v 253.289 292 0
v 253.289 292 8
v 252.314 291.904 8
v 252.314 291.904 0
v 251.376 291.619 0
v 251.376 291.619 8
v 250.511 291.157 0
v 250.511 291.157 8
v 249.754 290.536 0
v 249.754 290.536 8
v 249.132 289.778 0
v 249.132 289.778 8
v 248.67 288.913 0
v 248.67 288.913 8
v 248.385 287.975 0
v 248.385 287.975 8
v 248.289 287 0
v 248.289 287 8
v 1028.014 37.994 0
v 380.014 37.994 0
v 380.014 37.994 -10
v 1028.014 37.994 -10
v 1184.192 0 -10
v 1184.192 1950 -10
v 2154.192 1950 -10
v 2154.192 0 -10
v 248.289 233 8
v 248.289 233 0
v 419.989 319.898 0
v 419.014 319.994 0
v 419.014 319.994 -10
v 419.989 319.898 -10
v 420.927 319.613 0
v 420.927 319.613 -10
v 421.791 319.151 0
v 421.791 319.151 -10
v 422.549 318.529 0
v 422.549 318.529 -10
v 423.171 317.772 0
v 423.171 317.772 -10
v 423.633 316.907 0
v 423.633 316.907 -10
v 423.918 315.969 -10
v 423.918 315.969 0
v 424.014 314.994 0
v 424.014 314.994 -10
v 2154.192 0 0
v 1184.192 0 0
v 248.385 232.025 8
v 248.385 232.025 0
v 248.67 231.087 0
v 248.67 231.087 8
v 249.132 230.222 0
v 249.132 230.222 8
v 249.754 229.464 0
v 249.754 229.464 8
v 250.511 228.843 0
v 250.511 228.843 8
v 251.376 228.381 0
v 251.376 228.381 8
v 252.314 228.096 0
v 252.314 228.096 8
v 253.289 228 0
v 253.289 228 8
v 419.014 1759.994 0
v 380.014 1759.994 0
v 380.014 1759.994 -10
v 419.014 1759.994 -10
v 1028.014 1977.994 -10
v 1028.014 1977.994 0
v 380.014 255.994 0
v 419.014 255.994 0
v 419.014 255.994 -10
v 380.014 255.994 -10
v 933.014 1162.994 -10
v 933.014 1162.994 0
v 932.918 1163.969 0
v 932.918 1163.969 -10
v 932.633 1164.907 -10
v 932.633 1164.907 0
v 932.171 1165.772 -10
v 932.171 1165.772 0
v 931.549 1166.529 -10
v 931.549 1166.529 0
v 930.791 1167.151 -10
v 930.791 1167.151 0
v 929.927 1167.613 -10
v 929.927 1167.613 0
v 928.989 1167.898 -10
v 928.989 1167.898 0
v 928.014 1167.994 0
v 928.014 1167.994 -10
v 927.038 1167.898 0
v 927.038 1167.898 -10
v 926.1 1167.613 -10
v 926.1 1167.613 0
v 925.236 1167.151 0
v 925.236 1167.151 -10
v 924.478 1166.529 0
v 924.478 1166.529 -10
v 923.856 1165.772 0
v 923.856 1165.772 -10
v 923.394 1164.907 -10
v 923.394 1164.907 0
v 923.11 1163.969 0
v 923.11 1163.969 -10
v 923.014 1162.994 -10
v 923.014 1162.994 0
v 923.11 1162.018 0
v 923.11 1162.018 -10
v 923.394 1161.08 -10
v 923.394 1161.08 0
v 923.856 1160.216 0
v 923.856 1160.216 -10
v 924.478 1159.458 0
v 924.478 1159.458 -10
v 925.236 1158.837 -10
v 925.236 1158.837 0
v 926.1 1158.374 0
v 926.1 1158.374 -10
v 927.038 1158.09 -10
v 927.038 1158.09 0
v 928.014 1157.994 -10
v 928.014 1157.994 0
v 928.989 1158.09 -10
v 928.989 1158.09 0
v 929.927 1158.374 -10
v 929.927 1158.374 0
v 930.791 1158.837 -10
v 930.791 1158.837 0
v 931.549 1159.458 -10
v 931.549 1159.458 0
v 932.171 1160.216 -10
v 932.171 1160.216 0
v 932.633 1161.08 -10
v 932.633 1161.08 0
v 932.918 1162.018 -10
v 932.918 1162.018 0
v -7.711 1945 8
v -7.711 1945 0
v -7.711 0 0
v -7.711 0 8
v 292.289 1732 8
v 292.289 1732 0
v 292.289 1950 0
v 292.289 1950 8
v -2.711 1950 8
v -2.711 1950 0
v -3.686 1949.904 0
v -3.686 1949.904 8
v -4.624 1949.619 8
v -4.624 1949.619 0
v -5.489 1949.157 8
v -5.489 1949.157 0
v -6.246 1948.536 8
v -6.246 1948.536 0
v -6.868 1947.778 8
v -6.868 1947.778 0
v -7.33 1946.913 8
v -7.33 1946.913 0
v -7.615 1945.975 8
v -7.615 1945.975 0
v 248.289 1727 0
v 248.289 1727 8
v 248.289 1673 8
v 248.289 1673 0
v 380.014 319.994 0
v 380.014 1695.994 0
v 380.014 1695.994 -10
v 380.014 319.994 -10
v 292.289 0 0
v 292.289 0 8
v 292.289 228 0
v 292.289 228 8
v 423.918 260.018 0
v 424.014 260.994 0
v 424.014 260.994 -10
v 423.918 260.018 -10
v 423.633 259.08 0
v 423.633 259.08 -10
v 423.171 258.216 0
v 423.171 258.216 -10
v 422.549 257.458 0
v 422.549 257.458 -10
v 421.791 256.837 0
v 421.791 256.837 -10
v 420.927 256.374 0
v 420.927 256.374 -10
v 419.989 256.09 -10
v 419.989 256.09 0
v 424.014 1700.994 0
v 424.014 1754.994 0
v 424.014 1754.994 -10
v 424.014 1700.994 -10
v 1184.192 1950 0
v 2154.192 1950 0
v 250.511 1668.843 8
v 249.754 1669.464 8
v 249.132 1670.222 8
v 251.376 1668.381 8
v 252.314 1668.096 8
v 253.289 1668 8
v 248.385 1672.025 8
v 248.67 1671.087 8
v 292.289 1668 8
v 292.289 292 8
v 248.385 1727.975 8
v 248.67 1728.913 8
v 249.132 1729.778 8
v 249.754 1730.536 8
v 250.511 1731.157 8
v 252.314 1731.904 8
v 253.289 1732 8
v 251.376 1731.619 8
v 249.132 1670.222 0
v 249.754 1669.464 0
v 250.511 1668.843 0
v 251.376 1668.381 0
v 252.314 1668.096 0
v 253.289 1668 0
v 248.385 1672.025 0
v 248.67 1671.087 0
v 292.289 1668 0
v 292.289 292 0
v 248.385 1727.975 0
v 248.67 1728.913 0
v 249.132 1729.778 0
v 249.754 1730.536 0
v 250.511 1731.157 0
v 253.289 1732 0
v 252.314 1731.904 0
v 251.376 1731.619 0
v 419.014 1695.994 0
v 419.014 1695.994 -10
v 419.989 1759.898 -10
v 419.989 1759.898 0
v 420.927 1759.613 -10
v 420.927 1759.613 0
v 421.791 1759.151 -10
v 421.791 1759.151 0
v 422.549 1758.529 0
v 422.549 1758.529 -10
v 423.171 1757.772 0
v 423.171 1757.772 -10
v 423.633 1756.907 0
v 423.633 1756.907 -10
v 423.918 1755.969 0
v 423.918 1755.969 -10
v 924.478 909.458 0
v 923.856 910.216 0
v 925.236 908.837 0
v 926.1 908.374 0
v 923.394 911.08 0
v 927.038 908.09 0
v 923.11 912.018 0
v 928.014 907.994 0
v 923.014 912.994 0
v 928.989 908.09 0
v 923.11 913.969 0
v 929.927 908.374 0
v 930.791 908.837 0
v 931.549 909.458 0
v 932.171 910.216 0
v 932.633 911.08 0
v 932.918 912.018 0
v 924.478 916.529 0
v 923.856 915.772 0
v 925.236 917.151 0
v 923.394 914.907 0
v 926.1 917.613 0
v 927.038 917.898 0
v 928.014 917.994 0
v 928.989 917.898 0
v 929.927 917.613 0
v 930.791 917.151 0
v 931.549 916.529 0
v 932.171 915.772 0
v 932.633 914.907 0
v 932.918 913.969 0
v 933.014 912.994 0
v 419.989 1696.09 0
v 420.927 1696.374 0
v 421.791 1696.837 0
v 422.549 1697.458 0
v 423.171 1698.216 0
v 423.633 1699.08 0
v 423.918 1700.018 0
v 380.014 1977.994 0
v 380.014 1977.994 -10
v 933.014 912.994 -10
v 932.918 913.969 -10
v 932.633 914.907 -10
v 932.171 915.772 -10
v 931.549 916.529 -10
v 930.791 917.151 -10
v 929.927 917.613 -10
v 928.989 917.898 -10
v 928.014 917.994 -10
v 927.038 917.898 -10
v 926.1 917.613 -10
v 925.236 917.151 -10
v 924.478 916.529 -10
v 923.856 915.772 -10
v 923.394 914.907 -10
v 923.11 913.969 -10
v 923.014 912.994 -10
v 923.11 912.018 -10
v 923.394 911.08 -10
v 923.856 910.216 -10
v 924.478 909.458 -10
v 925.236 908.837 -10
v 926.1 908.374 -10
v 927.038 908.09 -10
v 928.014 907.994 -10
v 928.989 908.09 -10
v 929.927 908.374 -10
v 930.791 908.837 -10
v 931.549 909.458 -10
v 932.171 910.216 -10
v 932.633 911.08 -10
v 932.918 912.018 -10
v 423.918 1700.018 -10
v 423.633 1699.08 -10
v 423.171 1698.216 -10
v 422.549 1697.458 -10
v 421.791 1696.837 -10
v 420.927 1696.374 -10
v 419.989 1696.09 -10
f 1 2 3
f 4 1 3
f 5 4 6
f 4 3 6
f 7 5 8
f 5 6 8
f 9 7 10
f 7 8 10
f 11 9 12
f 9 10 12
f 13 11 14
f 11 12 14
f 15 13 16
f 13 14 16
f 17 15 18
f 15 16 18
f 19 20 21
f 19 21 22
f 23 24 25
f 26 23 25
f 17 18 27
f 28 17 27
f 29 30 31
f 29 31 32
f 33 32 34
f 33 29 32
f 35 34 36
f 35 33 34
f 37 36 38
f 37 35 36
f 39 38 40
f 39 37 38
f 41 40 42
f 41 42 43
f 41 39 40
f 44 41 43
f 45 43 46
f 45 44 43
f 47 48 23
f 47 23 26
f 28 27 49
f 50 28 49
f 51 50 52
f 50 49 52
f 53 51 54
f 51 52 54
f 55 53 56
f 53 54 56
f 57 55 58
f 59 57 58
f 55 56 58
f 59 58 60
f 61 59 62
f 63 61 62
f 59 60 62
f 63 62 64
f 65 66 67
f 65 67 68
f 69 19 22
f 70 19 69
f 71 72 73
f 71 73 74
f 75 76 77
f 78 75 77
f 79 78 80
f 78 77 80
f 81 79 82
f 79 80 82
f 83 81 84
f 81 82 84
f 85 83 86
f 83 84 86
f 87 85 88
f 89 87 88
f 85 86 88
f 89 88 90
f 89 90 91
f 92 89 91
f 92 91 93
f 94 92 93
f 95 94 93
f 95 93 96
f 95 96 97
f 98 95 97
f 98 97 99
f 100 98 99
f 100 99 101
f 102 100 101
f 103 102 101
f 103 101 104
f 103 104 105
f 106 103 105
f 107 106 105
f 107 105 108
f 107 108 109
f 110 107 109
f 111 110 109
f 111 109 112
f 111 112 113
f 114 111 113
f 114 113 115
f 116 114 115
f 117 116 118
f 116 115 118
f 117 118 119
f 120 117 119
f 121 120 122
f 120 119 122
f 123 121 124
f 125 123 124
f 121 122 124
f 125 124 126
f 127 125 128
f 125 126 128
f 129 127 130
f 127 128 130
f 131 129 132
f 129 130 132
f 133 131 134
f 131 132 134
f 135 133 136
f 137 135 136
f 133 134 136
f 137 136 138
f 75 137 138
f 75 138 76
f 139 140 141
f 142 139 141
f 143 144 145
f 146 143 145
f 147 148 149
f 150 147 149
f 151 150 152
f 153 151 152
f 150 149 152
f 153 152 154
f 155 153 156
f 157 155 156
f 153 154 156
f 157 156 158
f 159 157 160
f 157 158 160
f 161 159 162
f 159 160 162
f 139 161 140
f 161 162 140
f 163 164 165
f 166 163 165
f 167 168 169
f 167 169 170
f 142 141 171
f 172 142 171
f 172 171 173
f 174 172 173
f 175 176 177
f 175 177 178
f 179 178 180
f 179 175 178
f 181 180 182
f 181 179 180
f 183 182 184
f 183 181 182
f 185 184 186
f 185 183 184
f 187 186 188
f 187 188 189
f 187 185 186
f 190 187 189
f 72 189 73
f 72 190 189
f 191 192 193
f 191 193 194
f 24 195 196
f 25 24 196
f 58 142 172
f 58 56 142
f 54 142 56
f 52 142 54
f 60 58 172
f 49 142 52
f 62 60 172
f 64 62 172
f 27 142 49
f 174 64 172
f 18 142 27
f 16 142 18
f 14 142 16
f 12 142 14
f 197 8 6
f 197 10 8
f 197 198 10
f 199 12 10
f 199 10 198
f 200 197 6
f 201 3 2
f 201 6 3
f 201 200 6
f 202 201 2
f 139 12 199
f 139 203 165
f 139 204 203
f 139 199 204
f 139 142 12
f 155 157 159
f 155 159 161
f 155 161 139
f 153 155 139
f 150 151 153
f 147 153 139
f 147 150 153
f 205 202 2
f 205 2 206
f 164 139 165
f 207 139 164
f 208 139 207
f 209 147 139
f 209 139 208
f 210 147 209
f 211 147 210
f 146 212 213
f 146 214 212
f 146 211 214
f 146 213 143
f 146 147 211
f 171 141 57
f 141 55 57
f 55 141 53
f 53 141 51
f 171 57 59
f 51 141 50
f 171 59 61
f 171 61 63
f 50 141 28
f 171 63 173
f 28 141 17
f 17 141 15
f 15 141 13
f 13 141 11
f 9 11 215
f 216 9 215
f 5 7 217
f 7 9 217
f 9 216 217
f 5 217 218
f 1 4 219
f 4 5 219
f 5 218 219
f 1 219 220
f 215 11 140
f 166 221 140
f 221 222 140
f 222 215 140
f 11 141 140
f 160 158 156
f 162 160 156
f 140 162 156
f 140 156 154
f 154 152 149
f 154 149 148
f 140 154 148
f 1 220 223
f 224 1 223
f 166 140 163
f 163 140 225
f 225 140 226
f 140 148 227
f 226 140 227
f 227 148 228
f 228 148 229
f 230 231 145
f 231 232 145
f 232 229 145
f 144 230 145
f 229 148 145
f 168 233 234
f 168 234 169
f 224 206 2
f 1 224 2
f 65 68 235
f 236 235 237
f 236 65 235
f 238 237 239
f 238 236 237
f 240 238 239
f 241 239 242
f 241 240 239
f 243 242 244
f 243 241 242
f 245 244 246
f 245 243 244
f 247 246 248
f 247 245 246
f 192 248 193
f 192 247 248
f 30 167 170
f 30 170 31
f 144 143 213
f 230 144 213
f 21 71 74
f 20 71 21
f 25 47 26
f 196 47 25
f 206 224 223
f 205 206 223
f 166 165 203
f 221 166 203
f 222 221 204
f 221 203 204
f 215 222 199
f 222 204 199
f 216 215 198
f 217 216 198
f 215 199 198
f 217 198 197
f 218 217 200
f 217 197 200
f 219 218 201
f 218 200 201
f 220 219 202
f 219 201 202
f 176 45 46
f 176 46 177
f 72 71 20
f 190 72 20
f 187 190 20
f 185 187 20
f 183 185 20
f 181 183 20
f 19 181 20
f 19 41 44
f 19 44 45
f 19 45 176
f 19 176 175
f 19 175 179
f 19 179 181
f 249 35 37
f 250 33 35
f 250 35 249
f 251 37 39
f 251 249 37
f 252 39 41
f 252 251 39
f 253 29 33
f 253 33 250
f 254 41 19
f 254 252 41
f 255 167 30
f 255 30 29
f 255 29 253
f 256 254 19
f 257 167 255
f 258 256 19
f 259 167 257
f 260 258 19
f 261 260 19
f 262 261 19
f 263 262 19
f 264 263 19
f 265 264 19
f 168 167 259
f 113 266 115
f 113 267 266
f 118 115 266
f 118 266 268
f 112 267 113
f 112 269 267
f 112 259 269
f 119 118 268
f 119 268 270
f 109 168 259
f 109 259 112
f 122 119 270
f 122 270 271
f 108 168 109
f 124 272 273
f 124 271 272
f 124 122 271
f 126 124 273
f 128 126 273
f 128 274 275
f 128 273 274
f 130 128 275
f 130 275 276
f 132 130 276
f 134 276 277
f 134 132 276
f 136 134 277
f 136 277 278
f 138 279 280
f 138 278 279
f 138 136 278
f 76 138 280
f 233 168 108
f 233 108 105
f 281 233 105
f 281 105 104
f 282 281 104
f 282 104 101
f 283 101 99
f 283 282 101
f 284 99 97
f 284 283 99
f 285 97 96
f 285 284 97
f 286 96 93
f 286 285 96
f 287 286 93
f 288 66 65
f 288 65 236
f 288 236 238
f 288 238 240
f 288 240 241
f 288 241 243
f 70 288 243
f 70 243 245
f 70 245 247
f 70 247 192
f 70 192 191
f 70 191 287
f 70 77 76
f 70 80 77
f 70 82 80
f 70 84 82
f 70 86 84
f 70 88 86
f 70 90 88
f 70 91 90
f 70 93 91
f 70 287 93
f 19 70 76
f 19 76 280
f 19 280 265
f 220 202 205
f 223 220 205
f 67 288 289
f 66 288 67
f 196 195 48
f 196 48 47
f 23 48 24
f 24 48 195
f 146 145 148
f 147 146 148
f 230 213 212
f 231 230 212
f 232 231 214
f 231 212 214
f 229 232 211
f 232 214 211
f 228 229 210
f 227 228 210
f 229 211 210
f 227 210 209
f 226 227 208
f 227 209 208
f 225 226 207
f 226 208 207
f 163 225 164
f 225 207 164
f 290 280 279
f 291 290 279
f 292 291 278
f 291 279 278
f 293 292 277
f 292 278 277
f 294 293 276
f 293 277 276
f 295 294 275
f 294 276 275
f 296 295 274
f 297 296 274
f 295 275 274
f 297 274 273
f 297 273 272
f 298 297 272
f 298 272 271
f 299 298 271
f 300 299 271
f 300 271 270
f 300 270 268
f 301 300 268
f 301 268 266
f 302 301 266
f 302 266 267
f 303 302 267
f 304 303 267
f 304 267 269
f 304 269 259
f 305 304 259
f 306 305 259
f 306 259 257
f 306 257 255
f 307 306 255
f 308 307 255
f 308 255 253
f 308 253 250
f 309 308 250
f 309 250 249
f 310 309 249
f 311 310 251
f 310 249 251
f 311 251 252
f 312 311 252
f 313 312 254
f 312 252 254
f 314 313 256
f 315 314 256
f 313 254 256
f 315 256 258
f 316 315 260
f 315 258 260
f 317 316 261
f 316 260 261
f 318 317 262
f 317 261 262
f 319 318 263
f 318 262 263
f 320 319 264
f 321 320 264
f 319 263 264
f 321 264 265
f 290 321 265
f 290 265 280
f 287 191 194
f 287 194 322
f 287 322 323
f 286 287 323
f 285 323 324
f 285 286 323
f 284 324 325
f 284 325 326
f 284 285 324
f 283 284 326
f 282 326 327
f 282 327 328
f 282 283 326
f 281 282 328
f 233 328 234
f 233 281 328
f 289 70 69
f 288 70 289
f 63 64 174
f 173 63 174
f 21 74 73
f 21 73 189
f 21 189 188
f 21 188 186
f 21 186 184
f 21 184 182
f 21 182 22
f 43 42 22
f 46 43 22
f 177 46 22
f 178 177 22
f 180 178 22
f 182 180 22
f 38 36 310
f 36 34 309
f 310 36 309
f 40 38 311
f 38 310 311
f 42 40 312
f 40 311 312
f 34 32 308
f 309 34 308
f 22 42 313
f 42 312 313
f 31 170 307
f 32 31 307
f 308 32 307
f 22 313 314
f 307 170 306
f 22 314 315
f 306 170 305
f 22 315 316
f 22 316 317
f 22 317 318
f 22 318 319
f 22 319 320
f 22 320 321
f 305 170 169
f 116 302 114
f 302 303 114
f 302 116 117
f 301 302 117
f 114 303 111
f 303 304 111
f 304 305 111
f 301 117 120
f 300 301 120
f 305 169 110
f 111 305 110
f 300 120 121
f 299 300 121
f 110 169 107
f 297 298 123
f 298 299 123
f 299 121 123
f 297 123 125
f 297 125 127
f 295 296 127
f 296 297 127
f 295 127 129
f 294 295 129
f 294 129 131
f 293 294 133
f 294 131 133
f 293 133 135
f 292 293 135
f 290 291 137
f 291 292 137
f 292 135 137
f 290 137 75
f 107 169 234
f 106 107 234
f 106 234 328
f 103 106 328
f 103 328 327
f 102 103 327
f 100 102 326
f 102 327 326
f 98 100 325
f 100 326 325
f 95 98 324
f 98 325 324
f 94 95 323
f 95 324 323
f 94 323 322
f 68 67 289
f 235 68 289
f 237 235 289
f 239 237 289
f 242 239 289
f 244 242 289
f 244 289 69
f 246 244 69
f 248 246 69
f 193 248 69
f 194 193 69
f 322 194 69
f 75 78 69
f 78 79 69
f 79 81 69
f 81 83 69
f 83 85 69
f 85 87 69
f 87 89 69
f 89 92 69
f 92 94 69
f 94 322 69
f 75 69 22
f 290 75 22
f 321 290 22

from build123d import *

# Parameters (mm, degrees)
F1_DEPTH = 8
F3_DEPTH = 25
F5_DEPTH = 10
F6_R     = 5
F7_DEPTH = 10.001
F8_W     = 970
F8_H     = 1950
F9_DEPTH = 10


with BuildPart() as f1:
    # F0 (on Top) → F1 (new body)
    with BuildSketch(Plane.XY):
        with BuildLine():
            Line((-7.710888, 0), (292.289112, 0))
            Line((292.289112, 0), (292.289112, 1950))
            Line((292.289112, 1950), (-2.710888, 1950))
            ThreePointArc((-2.710888, 1950), (-6.246421, 1948.535534), (-7.710888, 1945))
            Line((-7.710888, 1945), (-7.710888, 0))
        make_face()
    extrude(amount=F1_DEPTH)

    # F2 (on face) → F3 (cut)
    with BuildSketch(Plane.XY.offset(8)):
        with BuildLine():
            Line((292.289112, 1668), (292.289112, 1732))
            Line((292.289112, 1732), (253.289112, 1732))
            ThreePointArc((253.289112, 1732), (249.753579, 1730.535534), (248.289112, 1727))
            Line((248.289112, 1727), (248.289112, 1673))
            ThreePointArc((248.289112, 1673), (249.753579, 1669.464466), (253.289112, 1668))
            Line((253.289112, 1668), (292.289112, 1668))
        make_face()
        with BuildLine():
            Line((292.289112, 228), (292.289112, 292))
            Line((292.289112, 292), (253.289112, 292))
            ThreePointArc((253.289112, 292), (249.753579, 290.535534), (248.289112, 287))
            Line((248.289112, 287), (248.289112, 233))
            ThreePointArc((248.289112, 233), (249.753579, 229.464466), (253.289112, 228))
            Line((253.289112, 228), (292.289112, 228))
        make_face()
    extrude(amount=-F3_DEPTH, mode=Mode.SUBTRACT)


with BuildPart() as f5:
    # F4 (on Top) → F5 (new body)
    with BuildSketch(Plane.XY):
        with BuildLine():
            Line((1028.013587, 1977.993873), (380.013587, 1977.993873))
            Line((380.013587, 1977.993873), (380.013587, 1759.993873))
            Line((380.013587, 1759.993873), (419.013587, 1759.993873))
            ThreePointArc((419.013587, 1759.993873), (422.549121, 1758.529407), (424.013587, 1754.993873))
            Line((424.013587, 1754.993873), (424.013587, 1700.993873))
            ThreePointArc((424.013587, 1700.993873), (422.549121, 1697.458339), (419.013587, 1695.993873))
            Line((419.013587, 1695.993873), (380.013587, 1695.993873))
            Line((380.013587, 1695.993873), (380.013587, 319.993873))
            Line((380.013587, 319.993873), (419.013587, 319.993873))
            ThreePointArc((419.013587, 319.993873), (422.549121, 318.529407), (424.013587, 314.993873))
            Line((424.013587, 314.993873), (424.013587, 260.993873))
            ThreePointArc((424.013587, 260.993873), (422.549121, 257.458339), (419.013587, 255.993873))
            Line((419.013587, 255.993873), (380.013587, 255.993873))
            Line((380.013587, 255.993873), (380.013587, 37.993873))
            Line((380.013587, 37.993873), (1028.013587, 37.993873))
            Line((1028.013587, 37.993873), (1028.013587, 1977.993873))
        make_face()
    extrude(amount=-F5_DEPTH)

    # F6 (on face) → F7 (cut, through all)
    with BuildSketch(Plane.XY):
        with Locations((928.013587, 1162.993873)):
            Circle(F6_R)
        with Locations((928.013587, 912.993873)):
            Circle(F6_R)
    extrude(amount=-F7_DEPTH, mode=Mode.SUBTRACT)


with BuildPart() as f9:
    # F8 (on Top) → F9 (new body)
    with BuildSketch(Plane.XY):
        with Locations((1669.192419, 975)):
            Rectangle(F8_W, F8_H)
    extrude(amount=-F9_DEPTH)


solid = Compound([f1.part, f5.part, f9.part])
